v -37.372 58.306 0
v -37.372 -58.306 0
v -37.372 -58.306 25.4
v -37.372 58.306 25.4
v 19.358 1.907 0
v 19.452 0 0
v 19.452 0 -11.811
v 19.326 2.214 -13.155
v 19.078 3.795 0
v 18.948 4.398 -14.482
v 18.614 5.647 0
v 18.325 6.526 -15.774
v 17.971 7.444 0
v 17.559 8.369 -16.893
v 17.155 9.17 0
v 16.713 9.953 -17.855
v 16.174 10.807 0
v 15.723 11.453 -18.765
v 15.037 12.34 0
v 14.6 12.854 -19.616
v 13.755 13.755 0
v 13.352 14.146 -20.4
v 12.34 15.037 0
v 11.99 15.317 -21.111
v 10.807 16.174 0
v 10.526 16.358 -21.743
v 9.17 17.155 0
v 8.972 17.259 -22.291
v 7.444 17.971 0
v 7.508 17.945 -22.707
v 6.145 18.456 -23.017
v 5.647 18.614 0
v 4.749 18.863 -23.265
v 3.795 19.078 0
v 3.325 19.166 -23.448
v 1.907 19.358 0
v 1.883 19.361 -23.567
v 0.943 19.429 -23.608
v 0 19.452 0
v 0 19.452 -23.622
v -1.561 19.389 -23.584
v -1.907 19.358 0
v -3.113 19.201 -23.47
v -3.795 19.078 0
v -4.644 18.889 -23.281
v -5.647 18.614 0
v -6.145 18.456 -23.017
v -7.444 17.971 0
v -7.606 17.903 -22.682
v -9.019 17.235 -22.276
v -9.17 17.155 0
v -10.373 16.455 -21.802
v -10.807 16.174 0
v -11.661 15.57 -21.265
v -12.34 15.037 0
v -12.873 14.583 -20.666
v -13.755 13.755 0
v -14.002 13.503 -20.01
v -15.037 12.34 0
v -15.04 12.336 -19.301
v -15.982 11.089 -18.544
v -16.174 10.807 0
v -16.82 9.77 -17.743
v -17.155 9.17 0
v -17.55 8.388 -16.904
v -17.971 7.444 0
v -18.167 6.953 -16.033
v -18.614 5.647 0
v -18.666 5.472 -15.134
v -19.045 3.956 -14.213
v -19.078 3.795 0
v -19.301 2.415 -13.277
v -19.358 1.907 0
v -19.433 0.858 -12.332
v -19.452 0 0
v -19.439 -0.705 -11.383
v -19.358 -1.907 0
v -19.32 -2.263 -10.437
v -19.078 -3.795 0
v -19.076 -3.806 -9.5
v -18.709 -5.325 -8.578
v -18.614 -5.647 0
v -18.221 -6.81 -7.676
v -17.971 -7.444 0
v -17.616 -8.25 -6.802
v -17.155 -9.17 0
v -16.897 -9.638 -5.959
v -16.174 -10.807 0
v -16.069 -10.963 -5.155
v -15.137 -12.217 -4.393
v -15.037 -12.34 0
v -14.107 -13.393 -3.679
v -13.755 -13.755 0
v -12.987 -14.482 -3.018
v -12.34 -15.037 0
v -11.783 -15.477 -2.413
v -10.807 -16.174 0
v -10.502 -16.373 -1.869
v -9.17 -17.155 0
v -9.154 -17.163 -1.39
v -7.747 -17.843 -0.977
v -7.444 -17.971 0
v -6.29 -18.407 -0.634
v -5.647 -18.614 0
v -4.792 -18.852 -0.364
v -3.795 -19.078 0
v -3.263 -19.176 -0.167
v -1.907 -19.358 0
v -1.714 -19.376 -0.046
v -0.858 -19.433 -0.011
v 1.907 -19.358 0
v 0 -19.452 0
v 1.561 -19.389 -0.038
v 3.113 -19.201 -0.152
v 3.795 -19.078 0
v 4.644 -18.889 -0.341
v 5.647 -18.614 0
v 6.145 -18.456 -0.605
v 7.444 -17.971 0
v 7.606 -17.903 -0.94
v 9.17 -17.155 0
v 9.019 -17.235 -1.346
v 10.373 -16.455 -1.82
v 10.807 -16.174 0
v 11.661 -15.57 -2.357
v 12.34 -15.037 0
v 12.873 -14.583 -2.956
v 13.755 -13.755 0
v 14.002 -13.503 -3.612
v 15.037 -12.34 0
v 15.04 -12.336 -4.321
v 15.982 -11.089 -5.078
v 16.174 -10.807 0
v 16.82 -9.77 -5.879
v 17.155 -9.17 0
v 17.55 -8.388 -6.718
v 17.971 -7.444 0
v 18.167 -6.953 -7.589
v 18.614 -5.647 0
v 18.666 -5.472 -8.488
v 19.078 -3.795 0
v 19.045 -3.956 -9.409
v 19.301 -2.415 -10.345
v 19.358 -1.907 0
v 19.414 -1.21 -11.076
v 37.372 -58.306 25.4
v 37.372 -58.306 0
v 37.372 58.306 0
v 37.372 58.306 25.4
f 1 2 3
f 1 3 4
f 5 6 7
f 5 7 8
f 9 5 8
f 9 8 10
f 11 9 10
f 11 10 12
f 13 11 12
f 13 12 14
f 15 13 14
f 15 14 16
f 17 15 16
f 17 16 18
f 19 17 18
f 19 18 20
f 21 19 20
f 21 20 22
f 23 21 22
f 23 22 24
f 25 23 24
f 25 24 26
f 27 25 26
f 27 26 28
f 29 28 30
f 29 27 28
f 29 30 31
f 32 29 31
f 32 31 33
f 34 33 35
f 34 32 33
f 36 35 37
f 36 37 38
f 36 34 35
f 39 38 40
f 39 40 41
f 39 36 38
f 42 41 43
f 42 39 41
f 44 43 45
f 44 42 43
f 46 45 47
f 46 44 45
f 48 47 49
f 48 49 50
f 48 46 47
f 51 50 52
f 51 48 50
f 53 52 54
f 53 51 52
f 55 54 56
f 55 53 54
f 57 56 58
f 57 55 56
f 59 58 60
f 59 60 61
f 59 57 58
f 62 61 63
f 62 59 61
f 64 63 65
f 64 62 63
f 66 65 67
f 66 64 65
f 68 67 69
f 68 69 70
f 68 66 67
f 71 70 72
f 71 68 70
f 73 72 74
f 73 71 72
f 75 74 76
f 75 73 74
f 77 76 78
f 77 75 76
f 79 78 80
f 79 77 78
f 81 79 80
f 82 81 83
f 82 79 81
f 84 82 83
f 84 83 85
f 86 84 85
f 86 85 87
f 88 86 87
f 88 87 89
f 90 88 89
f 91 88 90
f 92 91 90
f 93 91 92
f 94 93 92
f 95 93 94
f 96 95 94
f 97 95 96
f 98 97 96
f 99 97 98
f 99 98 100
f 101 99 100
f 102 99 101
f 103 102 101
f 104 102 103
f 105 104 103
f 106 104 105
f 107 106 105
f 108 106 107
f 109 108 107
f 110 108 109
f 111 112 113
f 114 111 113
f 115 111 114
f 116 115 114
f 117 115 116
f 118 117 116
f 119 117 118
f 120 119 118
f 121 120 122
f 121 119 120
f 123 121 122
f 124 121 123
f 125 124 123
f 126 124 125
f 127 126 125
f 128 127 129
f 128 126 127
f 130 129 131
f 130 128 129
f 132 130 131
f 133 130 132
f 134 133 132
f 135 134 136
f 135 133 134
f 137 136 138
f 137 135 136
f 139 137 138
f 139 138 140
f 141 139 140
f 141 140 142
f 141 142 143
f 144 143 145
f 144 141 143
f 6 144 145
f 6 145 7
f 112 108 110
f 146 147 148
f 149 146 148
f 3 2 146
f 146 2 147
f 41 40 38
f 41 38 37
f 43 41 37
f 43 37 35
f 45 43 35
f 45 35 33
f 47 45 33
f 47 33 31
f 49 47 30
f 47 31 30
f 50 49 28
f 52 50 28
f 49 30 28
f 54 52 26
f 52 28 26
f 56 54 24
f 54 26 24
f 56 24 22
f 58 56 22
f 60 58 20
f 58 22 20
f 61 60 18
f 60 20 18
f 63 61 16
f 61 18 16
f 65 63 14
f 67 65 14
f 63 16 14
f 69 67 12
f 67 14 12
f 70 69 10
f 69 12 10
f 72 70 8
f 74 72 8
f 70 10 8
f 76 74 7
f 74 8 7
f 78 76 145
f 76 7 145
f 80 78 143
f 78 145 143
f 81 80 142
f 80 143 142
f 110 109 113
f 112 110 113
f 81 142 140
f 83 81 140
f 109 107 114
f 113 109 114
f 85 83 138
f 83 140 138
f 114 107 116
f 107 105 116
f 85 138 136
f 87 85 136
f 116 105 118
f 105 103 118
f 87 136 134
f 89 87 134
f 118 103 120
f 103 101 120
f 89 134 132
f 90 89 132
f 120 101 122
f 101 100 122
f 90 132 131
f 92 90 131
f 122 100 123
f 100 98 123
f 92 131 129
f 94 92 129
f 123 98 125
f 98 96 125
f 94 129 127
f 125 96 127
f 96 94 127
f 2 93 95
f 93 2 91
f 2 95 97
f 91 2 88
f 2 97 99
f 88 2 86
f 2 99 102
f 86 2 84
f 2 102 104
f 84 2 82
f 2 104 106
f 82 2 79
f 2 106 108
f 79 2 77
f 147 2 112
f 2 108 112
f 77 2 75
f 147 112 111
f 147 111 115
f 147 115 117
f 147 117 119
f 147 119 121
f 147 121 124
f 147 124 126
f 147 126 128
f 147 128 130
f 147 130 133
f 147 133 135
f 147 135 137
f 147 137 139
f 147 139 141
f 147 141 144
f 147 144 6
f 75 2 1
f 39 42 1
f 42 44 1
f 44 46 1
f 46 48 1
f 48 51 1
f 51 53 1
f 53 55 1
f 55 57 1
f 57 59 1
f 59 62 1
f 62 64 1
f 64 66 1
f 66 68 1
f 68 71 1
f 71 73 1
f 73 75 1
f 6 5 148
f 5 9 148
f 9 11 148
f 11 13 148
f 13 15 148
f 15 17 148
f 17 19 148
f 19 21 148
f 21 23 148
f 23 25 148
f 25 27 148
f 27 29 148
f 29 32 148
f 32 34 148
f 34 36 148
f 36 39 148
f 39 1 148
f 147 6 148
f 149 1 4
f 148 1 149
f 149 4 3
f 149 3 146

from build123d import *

# Parameters (mm, degrees)
F0_W     = 74.744492
F0_H     = 116.611682
F0_R     = 19.451918
F1_DEPTH = 25.4
F2_DEPTH = 23.622
F4_DEPTH = 74.745493


with BuildPart() as f1:
    # F0 (on Top) → F1 (new body)
    with BuildSketch(Plane.XY):
        Rectangle(F0_W, F0_H)
        Circle(F0_R, mode=Mode.SUBTRACT)
        Circle(F0_R)
    extrude(amount=F1_DEPTH)

    # F0 (on Top) → F2 (join)
    with BuildSketch(Plane.XY):
        Circle(F0_R)
    extrude(amount=-F2_DEPTH)

    # F3 (on face) → F4 (cut, through all)
    with BuildSketch(Plane.YZ.offset(37.372246)):
        Polygon((-19.451918, 0), (-19.451918, -23.622), (19.451918, -23.622), align=None)
    extrude(amount=-F4_DEPTH, mode=Mode.SUBTRACT)


solid = f1.part
